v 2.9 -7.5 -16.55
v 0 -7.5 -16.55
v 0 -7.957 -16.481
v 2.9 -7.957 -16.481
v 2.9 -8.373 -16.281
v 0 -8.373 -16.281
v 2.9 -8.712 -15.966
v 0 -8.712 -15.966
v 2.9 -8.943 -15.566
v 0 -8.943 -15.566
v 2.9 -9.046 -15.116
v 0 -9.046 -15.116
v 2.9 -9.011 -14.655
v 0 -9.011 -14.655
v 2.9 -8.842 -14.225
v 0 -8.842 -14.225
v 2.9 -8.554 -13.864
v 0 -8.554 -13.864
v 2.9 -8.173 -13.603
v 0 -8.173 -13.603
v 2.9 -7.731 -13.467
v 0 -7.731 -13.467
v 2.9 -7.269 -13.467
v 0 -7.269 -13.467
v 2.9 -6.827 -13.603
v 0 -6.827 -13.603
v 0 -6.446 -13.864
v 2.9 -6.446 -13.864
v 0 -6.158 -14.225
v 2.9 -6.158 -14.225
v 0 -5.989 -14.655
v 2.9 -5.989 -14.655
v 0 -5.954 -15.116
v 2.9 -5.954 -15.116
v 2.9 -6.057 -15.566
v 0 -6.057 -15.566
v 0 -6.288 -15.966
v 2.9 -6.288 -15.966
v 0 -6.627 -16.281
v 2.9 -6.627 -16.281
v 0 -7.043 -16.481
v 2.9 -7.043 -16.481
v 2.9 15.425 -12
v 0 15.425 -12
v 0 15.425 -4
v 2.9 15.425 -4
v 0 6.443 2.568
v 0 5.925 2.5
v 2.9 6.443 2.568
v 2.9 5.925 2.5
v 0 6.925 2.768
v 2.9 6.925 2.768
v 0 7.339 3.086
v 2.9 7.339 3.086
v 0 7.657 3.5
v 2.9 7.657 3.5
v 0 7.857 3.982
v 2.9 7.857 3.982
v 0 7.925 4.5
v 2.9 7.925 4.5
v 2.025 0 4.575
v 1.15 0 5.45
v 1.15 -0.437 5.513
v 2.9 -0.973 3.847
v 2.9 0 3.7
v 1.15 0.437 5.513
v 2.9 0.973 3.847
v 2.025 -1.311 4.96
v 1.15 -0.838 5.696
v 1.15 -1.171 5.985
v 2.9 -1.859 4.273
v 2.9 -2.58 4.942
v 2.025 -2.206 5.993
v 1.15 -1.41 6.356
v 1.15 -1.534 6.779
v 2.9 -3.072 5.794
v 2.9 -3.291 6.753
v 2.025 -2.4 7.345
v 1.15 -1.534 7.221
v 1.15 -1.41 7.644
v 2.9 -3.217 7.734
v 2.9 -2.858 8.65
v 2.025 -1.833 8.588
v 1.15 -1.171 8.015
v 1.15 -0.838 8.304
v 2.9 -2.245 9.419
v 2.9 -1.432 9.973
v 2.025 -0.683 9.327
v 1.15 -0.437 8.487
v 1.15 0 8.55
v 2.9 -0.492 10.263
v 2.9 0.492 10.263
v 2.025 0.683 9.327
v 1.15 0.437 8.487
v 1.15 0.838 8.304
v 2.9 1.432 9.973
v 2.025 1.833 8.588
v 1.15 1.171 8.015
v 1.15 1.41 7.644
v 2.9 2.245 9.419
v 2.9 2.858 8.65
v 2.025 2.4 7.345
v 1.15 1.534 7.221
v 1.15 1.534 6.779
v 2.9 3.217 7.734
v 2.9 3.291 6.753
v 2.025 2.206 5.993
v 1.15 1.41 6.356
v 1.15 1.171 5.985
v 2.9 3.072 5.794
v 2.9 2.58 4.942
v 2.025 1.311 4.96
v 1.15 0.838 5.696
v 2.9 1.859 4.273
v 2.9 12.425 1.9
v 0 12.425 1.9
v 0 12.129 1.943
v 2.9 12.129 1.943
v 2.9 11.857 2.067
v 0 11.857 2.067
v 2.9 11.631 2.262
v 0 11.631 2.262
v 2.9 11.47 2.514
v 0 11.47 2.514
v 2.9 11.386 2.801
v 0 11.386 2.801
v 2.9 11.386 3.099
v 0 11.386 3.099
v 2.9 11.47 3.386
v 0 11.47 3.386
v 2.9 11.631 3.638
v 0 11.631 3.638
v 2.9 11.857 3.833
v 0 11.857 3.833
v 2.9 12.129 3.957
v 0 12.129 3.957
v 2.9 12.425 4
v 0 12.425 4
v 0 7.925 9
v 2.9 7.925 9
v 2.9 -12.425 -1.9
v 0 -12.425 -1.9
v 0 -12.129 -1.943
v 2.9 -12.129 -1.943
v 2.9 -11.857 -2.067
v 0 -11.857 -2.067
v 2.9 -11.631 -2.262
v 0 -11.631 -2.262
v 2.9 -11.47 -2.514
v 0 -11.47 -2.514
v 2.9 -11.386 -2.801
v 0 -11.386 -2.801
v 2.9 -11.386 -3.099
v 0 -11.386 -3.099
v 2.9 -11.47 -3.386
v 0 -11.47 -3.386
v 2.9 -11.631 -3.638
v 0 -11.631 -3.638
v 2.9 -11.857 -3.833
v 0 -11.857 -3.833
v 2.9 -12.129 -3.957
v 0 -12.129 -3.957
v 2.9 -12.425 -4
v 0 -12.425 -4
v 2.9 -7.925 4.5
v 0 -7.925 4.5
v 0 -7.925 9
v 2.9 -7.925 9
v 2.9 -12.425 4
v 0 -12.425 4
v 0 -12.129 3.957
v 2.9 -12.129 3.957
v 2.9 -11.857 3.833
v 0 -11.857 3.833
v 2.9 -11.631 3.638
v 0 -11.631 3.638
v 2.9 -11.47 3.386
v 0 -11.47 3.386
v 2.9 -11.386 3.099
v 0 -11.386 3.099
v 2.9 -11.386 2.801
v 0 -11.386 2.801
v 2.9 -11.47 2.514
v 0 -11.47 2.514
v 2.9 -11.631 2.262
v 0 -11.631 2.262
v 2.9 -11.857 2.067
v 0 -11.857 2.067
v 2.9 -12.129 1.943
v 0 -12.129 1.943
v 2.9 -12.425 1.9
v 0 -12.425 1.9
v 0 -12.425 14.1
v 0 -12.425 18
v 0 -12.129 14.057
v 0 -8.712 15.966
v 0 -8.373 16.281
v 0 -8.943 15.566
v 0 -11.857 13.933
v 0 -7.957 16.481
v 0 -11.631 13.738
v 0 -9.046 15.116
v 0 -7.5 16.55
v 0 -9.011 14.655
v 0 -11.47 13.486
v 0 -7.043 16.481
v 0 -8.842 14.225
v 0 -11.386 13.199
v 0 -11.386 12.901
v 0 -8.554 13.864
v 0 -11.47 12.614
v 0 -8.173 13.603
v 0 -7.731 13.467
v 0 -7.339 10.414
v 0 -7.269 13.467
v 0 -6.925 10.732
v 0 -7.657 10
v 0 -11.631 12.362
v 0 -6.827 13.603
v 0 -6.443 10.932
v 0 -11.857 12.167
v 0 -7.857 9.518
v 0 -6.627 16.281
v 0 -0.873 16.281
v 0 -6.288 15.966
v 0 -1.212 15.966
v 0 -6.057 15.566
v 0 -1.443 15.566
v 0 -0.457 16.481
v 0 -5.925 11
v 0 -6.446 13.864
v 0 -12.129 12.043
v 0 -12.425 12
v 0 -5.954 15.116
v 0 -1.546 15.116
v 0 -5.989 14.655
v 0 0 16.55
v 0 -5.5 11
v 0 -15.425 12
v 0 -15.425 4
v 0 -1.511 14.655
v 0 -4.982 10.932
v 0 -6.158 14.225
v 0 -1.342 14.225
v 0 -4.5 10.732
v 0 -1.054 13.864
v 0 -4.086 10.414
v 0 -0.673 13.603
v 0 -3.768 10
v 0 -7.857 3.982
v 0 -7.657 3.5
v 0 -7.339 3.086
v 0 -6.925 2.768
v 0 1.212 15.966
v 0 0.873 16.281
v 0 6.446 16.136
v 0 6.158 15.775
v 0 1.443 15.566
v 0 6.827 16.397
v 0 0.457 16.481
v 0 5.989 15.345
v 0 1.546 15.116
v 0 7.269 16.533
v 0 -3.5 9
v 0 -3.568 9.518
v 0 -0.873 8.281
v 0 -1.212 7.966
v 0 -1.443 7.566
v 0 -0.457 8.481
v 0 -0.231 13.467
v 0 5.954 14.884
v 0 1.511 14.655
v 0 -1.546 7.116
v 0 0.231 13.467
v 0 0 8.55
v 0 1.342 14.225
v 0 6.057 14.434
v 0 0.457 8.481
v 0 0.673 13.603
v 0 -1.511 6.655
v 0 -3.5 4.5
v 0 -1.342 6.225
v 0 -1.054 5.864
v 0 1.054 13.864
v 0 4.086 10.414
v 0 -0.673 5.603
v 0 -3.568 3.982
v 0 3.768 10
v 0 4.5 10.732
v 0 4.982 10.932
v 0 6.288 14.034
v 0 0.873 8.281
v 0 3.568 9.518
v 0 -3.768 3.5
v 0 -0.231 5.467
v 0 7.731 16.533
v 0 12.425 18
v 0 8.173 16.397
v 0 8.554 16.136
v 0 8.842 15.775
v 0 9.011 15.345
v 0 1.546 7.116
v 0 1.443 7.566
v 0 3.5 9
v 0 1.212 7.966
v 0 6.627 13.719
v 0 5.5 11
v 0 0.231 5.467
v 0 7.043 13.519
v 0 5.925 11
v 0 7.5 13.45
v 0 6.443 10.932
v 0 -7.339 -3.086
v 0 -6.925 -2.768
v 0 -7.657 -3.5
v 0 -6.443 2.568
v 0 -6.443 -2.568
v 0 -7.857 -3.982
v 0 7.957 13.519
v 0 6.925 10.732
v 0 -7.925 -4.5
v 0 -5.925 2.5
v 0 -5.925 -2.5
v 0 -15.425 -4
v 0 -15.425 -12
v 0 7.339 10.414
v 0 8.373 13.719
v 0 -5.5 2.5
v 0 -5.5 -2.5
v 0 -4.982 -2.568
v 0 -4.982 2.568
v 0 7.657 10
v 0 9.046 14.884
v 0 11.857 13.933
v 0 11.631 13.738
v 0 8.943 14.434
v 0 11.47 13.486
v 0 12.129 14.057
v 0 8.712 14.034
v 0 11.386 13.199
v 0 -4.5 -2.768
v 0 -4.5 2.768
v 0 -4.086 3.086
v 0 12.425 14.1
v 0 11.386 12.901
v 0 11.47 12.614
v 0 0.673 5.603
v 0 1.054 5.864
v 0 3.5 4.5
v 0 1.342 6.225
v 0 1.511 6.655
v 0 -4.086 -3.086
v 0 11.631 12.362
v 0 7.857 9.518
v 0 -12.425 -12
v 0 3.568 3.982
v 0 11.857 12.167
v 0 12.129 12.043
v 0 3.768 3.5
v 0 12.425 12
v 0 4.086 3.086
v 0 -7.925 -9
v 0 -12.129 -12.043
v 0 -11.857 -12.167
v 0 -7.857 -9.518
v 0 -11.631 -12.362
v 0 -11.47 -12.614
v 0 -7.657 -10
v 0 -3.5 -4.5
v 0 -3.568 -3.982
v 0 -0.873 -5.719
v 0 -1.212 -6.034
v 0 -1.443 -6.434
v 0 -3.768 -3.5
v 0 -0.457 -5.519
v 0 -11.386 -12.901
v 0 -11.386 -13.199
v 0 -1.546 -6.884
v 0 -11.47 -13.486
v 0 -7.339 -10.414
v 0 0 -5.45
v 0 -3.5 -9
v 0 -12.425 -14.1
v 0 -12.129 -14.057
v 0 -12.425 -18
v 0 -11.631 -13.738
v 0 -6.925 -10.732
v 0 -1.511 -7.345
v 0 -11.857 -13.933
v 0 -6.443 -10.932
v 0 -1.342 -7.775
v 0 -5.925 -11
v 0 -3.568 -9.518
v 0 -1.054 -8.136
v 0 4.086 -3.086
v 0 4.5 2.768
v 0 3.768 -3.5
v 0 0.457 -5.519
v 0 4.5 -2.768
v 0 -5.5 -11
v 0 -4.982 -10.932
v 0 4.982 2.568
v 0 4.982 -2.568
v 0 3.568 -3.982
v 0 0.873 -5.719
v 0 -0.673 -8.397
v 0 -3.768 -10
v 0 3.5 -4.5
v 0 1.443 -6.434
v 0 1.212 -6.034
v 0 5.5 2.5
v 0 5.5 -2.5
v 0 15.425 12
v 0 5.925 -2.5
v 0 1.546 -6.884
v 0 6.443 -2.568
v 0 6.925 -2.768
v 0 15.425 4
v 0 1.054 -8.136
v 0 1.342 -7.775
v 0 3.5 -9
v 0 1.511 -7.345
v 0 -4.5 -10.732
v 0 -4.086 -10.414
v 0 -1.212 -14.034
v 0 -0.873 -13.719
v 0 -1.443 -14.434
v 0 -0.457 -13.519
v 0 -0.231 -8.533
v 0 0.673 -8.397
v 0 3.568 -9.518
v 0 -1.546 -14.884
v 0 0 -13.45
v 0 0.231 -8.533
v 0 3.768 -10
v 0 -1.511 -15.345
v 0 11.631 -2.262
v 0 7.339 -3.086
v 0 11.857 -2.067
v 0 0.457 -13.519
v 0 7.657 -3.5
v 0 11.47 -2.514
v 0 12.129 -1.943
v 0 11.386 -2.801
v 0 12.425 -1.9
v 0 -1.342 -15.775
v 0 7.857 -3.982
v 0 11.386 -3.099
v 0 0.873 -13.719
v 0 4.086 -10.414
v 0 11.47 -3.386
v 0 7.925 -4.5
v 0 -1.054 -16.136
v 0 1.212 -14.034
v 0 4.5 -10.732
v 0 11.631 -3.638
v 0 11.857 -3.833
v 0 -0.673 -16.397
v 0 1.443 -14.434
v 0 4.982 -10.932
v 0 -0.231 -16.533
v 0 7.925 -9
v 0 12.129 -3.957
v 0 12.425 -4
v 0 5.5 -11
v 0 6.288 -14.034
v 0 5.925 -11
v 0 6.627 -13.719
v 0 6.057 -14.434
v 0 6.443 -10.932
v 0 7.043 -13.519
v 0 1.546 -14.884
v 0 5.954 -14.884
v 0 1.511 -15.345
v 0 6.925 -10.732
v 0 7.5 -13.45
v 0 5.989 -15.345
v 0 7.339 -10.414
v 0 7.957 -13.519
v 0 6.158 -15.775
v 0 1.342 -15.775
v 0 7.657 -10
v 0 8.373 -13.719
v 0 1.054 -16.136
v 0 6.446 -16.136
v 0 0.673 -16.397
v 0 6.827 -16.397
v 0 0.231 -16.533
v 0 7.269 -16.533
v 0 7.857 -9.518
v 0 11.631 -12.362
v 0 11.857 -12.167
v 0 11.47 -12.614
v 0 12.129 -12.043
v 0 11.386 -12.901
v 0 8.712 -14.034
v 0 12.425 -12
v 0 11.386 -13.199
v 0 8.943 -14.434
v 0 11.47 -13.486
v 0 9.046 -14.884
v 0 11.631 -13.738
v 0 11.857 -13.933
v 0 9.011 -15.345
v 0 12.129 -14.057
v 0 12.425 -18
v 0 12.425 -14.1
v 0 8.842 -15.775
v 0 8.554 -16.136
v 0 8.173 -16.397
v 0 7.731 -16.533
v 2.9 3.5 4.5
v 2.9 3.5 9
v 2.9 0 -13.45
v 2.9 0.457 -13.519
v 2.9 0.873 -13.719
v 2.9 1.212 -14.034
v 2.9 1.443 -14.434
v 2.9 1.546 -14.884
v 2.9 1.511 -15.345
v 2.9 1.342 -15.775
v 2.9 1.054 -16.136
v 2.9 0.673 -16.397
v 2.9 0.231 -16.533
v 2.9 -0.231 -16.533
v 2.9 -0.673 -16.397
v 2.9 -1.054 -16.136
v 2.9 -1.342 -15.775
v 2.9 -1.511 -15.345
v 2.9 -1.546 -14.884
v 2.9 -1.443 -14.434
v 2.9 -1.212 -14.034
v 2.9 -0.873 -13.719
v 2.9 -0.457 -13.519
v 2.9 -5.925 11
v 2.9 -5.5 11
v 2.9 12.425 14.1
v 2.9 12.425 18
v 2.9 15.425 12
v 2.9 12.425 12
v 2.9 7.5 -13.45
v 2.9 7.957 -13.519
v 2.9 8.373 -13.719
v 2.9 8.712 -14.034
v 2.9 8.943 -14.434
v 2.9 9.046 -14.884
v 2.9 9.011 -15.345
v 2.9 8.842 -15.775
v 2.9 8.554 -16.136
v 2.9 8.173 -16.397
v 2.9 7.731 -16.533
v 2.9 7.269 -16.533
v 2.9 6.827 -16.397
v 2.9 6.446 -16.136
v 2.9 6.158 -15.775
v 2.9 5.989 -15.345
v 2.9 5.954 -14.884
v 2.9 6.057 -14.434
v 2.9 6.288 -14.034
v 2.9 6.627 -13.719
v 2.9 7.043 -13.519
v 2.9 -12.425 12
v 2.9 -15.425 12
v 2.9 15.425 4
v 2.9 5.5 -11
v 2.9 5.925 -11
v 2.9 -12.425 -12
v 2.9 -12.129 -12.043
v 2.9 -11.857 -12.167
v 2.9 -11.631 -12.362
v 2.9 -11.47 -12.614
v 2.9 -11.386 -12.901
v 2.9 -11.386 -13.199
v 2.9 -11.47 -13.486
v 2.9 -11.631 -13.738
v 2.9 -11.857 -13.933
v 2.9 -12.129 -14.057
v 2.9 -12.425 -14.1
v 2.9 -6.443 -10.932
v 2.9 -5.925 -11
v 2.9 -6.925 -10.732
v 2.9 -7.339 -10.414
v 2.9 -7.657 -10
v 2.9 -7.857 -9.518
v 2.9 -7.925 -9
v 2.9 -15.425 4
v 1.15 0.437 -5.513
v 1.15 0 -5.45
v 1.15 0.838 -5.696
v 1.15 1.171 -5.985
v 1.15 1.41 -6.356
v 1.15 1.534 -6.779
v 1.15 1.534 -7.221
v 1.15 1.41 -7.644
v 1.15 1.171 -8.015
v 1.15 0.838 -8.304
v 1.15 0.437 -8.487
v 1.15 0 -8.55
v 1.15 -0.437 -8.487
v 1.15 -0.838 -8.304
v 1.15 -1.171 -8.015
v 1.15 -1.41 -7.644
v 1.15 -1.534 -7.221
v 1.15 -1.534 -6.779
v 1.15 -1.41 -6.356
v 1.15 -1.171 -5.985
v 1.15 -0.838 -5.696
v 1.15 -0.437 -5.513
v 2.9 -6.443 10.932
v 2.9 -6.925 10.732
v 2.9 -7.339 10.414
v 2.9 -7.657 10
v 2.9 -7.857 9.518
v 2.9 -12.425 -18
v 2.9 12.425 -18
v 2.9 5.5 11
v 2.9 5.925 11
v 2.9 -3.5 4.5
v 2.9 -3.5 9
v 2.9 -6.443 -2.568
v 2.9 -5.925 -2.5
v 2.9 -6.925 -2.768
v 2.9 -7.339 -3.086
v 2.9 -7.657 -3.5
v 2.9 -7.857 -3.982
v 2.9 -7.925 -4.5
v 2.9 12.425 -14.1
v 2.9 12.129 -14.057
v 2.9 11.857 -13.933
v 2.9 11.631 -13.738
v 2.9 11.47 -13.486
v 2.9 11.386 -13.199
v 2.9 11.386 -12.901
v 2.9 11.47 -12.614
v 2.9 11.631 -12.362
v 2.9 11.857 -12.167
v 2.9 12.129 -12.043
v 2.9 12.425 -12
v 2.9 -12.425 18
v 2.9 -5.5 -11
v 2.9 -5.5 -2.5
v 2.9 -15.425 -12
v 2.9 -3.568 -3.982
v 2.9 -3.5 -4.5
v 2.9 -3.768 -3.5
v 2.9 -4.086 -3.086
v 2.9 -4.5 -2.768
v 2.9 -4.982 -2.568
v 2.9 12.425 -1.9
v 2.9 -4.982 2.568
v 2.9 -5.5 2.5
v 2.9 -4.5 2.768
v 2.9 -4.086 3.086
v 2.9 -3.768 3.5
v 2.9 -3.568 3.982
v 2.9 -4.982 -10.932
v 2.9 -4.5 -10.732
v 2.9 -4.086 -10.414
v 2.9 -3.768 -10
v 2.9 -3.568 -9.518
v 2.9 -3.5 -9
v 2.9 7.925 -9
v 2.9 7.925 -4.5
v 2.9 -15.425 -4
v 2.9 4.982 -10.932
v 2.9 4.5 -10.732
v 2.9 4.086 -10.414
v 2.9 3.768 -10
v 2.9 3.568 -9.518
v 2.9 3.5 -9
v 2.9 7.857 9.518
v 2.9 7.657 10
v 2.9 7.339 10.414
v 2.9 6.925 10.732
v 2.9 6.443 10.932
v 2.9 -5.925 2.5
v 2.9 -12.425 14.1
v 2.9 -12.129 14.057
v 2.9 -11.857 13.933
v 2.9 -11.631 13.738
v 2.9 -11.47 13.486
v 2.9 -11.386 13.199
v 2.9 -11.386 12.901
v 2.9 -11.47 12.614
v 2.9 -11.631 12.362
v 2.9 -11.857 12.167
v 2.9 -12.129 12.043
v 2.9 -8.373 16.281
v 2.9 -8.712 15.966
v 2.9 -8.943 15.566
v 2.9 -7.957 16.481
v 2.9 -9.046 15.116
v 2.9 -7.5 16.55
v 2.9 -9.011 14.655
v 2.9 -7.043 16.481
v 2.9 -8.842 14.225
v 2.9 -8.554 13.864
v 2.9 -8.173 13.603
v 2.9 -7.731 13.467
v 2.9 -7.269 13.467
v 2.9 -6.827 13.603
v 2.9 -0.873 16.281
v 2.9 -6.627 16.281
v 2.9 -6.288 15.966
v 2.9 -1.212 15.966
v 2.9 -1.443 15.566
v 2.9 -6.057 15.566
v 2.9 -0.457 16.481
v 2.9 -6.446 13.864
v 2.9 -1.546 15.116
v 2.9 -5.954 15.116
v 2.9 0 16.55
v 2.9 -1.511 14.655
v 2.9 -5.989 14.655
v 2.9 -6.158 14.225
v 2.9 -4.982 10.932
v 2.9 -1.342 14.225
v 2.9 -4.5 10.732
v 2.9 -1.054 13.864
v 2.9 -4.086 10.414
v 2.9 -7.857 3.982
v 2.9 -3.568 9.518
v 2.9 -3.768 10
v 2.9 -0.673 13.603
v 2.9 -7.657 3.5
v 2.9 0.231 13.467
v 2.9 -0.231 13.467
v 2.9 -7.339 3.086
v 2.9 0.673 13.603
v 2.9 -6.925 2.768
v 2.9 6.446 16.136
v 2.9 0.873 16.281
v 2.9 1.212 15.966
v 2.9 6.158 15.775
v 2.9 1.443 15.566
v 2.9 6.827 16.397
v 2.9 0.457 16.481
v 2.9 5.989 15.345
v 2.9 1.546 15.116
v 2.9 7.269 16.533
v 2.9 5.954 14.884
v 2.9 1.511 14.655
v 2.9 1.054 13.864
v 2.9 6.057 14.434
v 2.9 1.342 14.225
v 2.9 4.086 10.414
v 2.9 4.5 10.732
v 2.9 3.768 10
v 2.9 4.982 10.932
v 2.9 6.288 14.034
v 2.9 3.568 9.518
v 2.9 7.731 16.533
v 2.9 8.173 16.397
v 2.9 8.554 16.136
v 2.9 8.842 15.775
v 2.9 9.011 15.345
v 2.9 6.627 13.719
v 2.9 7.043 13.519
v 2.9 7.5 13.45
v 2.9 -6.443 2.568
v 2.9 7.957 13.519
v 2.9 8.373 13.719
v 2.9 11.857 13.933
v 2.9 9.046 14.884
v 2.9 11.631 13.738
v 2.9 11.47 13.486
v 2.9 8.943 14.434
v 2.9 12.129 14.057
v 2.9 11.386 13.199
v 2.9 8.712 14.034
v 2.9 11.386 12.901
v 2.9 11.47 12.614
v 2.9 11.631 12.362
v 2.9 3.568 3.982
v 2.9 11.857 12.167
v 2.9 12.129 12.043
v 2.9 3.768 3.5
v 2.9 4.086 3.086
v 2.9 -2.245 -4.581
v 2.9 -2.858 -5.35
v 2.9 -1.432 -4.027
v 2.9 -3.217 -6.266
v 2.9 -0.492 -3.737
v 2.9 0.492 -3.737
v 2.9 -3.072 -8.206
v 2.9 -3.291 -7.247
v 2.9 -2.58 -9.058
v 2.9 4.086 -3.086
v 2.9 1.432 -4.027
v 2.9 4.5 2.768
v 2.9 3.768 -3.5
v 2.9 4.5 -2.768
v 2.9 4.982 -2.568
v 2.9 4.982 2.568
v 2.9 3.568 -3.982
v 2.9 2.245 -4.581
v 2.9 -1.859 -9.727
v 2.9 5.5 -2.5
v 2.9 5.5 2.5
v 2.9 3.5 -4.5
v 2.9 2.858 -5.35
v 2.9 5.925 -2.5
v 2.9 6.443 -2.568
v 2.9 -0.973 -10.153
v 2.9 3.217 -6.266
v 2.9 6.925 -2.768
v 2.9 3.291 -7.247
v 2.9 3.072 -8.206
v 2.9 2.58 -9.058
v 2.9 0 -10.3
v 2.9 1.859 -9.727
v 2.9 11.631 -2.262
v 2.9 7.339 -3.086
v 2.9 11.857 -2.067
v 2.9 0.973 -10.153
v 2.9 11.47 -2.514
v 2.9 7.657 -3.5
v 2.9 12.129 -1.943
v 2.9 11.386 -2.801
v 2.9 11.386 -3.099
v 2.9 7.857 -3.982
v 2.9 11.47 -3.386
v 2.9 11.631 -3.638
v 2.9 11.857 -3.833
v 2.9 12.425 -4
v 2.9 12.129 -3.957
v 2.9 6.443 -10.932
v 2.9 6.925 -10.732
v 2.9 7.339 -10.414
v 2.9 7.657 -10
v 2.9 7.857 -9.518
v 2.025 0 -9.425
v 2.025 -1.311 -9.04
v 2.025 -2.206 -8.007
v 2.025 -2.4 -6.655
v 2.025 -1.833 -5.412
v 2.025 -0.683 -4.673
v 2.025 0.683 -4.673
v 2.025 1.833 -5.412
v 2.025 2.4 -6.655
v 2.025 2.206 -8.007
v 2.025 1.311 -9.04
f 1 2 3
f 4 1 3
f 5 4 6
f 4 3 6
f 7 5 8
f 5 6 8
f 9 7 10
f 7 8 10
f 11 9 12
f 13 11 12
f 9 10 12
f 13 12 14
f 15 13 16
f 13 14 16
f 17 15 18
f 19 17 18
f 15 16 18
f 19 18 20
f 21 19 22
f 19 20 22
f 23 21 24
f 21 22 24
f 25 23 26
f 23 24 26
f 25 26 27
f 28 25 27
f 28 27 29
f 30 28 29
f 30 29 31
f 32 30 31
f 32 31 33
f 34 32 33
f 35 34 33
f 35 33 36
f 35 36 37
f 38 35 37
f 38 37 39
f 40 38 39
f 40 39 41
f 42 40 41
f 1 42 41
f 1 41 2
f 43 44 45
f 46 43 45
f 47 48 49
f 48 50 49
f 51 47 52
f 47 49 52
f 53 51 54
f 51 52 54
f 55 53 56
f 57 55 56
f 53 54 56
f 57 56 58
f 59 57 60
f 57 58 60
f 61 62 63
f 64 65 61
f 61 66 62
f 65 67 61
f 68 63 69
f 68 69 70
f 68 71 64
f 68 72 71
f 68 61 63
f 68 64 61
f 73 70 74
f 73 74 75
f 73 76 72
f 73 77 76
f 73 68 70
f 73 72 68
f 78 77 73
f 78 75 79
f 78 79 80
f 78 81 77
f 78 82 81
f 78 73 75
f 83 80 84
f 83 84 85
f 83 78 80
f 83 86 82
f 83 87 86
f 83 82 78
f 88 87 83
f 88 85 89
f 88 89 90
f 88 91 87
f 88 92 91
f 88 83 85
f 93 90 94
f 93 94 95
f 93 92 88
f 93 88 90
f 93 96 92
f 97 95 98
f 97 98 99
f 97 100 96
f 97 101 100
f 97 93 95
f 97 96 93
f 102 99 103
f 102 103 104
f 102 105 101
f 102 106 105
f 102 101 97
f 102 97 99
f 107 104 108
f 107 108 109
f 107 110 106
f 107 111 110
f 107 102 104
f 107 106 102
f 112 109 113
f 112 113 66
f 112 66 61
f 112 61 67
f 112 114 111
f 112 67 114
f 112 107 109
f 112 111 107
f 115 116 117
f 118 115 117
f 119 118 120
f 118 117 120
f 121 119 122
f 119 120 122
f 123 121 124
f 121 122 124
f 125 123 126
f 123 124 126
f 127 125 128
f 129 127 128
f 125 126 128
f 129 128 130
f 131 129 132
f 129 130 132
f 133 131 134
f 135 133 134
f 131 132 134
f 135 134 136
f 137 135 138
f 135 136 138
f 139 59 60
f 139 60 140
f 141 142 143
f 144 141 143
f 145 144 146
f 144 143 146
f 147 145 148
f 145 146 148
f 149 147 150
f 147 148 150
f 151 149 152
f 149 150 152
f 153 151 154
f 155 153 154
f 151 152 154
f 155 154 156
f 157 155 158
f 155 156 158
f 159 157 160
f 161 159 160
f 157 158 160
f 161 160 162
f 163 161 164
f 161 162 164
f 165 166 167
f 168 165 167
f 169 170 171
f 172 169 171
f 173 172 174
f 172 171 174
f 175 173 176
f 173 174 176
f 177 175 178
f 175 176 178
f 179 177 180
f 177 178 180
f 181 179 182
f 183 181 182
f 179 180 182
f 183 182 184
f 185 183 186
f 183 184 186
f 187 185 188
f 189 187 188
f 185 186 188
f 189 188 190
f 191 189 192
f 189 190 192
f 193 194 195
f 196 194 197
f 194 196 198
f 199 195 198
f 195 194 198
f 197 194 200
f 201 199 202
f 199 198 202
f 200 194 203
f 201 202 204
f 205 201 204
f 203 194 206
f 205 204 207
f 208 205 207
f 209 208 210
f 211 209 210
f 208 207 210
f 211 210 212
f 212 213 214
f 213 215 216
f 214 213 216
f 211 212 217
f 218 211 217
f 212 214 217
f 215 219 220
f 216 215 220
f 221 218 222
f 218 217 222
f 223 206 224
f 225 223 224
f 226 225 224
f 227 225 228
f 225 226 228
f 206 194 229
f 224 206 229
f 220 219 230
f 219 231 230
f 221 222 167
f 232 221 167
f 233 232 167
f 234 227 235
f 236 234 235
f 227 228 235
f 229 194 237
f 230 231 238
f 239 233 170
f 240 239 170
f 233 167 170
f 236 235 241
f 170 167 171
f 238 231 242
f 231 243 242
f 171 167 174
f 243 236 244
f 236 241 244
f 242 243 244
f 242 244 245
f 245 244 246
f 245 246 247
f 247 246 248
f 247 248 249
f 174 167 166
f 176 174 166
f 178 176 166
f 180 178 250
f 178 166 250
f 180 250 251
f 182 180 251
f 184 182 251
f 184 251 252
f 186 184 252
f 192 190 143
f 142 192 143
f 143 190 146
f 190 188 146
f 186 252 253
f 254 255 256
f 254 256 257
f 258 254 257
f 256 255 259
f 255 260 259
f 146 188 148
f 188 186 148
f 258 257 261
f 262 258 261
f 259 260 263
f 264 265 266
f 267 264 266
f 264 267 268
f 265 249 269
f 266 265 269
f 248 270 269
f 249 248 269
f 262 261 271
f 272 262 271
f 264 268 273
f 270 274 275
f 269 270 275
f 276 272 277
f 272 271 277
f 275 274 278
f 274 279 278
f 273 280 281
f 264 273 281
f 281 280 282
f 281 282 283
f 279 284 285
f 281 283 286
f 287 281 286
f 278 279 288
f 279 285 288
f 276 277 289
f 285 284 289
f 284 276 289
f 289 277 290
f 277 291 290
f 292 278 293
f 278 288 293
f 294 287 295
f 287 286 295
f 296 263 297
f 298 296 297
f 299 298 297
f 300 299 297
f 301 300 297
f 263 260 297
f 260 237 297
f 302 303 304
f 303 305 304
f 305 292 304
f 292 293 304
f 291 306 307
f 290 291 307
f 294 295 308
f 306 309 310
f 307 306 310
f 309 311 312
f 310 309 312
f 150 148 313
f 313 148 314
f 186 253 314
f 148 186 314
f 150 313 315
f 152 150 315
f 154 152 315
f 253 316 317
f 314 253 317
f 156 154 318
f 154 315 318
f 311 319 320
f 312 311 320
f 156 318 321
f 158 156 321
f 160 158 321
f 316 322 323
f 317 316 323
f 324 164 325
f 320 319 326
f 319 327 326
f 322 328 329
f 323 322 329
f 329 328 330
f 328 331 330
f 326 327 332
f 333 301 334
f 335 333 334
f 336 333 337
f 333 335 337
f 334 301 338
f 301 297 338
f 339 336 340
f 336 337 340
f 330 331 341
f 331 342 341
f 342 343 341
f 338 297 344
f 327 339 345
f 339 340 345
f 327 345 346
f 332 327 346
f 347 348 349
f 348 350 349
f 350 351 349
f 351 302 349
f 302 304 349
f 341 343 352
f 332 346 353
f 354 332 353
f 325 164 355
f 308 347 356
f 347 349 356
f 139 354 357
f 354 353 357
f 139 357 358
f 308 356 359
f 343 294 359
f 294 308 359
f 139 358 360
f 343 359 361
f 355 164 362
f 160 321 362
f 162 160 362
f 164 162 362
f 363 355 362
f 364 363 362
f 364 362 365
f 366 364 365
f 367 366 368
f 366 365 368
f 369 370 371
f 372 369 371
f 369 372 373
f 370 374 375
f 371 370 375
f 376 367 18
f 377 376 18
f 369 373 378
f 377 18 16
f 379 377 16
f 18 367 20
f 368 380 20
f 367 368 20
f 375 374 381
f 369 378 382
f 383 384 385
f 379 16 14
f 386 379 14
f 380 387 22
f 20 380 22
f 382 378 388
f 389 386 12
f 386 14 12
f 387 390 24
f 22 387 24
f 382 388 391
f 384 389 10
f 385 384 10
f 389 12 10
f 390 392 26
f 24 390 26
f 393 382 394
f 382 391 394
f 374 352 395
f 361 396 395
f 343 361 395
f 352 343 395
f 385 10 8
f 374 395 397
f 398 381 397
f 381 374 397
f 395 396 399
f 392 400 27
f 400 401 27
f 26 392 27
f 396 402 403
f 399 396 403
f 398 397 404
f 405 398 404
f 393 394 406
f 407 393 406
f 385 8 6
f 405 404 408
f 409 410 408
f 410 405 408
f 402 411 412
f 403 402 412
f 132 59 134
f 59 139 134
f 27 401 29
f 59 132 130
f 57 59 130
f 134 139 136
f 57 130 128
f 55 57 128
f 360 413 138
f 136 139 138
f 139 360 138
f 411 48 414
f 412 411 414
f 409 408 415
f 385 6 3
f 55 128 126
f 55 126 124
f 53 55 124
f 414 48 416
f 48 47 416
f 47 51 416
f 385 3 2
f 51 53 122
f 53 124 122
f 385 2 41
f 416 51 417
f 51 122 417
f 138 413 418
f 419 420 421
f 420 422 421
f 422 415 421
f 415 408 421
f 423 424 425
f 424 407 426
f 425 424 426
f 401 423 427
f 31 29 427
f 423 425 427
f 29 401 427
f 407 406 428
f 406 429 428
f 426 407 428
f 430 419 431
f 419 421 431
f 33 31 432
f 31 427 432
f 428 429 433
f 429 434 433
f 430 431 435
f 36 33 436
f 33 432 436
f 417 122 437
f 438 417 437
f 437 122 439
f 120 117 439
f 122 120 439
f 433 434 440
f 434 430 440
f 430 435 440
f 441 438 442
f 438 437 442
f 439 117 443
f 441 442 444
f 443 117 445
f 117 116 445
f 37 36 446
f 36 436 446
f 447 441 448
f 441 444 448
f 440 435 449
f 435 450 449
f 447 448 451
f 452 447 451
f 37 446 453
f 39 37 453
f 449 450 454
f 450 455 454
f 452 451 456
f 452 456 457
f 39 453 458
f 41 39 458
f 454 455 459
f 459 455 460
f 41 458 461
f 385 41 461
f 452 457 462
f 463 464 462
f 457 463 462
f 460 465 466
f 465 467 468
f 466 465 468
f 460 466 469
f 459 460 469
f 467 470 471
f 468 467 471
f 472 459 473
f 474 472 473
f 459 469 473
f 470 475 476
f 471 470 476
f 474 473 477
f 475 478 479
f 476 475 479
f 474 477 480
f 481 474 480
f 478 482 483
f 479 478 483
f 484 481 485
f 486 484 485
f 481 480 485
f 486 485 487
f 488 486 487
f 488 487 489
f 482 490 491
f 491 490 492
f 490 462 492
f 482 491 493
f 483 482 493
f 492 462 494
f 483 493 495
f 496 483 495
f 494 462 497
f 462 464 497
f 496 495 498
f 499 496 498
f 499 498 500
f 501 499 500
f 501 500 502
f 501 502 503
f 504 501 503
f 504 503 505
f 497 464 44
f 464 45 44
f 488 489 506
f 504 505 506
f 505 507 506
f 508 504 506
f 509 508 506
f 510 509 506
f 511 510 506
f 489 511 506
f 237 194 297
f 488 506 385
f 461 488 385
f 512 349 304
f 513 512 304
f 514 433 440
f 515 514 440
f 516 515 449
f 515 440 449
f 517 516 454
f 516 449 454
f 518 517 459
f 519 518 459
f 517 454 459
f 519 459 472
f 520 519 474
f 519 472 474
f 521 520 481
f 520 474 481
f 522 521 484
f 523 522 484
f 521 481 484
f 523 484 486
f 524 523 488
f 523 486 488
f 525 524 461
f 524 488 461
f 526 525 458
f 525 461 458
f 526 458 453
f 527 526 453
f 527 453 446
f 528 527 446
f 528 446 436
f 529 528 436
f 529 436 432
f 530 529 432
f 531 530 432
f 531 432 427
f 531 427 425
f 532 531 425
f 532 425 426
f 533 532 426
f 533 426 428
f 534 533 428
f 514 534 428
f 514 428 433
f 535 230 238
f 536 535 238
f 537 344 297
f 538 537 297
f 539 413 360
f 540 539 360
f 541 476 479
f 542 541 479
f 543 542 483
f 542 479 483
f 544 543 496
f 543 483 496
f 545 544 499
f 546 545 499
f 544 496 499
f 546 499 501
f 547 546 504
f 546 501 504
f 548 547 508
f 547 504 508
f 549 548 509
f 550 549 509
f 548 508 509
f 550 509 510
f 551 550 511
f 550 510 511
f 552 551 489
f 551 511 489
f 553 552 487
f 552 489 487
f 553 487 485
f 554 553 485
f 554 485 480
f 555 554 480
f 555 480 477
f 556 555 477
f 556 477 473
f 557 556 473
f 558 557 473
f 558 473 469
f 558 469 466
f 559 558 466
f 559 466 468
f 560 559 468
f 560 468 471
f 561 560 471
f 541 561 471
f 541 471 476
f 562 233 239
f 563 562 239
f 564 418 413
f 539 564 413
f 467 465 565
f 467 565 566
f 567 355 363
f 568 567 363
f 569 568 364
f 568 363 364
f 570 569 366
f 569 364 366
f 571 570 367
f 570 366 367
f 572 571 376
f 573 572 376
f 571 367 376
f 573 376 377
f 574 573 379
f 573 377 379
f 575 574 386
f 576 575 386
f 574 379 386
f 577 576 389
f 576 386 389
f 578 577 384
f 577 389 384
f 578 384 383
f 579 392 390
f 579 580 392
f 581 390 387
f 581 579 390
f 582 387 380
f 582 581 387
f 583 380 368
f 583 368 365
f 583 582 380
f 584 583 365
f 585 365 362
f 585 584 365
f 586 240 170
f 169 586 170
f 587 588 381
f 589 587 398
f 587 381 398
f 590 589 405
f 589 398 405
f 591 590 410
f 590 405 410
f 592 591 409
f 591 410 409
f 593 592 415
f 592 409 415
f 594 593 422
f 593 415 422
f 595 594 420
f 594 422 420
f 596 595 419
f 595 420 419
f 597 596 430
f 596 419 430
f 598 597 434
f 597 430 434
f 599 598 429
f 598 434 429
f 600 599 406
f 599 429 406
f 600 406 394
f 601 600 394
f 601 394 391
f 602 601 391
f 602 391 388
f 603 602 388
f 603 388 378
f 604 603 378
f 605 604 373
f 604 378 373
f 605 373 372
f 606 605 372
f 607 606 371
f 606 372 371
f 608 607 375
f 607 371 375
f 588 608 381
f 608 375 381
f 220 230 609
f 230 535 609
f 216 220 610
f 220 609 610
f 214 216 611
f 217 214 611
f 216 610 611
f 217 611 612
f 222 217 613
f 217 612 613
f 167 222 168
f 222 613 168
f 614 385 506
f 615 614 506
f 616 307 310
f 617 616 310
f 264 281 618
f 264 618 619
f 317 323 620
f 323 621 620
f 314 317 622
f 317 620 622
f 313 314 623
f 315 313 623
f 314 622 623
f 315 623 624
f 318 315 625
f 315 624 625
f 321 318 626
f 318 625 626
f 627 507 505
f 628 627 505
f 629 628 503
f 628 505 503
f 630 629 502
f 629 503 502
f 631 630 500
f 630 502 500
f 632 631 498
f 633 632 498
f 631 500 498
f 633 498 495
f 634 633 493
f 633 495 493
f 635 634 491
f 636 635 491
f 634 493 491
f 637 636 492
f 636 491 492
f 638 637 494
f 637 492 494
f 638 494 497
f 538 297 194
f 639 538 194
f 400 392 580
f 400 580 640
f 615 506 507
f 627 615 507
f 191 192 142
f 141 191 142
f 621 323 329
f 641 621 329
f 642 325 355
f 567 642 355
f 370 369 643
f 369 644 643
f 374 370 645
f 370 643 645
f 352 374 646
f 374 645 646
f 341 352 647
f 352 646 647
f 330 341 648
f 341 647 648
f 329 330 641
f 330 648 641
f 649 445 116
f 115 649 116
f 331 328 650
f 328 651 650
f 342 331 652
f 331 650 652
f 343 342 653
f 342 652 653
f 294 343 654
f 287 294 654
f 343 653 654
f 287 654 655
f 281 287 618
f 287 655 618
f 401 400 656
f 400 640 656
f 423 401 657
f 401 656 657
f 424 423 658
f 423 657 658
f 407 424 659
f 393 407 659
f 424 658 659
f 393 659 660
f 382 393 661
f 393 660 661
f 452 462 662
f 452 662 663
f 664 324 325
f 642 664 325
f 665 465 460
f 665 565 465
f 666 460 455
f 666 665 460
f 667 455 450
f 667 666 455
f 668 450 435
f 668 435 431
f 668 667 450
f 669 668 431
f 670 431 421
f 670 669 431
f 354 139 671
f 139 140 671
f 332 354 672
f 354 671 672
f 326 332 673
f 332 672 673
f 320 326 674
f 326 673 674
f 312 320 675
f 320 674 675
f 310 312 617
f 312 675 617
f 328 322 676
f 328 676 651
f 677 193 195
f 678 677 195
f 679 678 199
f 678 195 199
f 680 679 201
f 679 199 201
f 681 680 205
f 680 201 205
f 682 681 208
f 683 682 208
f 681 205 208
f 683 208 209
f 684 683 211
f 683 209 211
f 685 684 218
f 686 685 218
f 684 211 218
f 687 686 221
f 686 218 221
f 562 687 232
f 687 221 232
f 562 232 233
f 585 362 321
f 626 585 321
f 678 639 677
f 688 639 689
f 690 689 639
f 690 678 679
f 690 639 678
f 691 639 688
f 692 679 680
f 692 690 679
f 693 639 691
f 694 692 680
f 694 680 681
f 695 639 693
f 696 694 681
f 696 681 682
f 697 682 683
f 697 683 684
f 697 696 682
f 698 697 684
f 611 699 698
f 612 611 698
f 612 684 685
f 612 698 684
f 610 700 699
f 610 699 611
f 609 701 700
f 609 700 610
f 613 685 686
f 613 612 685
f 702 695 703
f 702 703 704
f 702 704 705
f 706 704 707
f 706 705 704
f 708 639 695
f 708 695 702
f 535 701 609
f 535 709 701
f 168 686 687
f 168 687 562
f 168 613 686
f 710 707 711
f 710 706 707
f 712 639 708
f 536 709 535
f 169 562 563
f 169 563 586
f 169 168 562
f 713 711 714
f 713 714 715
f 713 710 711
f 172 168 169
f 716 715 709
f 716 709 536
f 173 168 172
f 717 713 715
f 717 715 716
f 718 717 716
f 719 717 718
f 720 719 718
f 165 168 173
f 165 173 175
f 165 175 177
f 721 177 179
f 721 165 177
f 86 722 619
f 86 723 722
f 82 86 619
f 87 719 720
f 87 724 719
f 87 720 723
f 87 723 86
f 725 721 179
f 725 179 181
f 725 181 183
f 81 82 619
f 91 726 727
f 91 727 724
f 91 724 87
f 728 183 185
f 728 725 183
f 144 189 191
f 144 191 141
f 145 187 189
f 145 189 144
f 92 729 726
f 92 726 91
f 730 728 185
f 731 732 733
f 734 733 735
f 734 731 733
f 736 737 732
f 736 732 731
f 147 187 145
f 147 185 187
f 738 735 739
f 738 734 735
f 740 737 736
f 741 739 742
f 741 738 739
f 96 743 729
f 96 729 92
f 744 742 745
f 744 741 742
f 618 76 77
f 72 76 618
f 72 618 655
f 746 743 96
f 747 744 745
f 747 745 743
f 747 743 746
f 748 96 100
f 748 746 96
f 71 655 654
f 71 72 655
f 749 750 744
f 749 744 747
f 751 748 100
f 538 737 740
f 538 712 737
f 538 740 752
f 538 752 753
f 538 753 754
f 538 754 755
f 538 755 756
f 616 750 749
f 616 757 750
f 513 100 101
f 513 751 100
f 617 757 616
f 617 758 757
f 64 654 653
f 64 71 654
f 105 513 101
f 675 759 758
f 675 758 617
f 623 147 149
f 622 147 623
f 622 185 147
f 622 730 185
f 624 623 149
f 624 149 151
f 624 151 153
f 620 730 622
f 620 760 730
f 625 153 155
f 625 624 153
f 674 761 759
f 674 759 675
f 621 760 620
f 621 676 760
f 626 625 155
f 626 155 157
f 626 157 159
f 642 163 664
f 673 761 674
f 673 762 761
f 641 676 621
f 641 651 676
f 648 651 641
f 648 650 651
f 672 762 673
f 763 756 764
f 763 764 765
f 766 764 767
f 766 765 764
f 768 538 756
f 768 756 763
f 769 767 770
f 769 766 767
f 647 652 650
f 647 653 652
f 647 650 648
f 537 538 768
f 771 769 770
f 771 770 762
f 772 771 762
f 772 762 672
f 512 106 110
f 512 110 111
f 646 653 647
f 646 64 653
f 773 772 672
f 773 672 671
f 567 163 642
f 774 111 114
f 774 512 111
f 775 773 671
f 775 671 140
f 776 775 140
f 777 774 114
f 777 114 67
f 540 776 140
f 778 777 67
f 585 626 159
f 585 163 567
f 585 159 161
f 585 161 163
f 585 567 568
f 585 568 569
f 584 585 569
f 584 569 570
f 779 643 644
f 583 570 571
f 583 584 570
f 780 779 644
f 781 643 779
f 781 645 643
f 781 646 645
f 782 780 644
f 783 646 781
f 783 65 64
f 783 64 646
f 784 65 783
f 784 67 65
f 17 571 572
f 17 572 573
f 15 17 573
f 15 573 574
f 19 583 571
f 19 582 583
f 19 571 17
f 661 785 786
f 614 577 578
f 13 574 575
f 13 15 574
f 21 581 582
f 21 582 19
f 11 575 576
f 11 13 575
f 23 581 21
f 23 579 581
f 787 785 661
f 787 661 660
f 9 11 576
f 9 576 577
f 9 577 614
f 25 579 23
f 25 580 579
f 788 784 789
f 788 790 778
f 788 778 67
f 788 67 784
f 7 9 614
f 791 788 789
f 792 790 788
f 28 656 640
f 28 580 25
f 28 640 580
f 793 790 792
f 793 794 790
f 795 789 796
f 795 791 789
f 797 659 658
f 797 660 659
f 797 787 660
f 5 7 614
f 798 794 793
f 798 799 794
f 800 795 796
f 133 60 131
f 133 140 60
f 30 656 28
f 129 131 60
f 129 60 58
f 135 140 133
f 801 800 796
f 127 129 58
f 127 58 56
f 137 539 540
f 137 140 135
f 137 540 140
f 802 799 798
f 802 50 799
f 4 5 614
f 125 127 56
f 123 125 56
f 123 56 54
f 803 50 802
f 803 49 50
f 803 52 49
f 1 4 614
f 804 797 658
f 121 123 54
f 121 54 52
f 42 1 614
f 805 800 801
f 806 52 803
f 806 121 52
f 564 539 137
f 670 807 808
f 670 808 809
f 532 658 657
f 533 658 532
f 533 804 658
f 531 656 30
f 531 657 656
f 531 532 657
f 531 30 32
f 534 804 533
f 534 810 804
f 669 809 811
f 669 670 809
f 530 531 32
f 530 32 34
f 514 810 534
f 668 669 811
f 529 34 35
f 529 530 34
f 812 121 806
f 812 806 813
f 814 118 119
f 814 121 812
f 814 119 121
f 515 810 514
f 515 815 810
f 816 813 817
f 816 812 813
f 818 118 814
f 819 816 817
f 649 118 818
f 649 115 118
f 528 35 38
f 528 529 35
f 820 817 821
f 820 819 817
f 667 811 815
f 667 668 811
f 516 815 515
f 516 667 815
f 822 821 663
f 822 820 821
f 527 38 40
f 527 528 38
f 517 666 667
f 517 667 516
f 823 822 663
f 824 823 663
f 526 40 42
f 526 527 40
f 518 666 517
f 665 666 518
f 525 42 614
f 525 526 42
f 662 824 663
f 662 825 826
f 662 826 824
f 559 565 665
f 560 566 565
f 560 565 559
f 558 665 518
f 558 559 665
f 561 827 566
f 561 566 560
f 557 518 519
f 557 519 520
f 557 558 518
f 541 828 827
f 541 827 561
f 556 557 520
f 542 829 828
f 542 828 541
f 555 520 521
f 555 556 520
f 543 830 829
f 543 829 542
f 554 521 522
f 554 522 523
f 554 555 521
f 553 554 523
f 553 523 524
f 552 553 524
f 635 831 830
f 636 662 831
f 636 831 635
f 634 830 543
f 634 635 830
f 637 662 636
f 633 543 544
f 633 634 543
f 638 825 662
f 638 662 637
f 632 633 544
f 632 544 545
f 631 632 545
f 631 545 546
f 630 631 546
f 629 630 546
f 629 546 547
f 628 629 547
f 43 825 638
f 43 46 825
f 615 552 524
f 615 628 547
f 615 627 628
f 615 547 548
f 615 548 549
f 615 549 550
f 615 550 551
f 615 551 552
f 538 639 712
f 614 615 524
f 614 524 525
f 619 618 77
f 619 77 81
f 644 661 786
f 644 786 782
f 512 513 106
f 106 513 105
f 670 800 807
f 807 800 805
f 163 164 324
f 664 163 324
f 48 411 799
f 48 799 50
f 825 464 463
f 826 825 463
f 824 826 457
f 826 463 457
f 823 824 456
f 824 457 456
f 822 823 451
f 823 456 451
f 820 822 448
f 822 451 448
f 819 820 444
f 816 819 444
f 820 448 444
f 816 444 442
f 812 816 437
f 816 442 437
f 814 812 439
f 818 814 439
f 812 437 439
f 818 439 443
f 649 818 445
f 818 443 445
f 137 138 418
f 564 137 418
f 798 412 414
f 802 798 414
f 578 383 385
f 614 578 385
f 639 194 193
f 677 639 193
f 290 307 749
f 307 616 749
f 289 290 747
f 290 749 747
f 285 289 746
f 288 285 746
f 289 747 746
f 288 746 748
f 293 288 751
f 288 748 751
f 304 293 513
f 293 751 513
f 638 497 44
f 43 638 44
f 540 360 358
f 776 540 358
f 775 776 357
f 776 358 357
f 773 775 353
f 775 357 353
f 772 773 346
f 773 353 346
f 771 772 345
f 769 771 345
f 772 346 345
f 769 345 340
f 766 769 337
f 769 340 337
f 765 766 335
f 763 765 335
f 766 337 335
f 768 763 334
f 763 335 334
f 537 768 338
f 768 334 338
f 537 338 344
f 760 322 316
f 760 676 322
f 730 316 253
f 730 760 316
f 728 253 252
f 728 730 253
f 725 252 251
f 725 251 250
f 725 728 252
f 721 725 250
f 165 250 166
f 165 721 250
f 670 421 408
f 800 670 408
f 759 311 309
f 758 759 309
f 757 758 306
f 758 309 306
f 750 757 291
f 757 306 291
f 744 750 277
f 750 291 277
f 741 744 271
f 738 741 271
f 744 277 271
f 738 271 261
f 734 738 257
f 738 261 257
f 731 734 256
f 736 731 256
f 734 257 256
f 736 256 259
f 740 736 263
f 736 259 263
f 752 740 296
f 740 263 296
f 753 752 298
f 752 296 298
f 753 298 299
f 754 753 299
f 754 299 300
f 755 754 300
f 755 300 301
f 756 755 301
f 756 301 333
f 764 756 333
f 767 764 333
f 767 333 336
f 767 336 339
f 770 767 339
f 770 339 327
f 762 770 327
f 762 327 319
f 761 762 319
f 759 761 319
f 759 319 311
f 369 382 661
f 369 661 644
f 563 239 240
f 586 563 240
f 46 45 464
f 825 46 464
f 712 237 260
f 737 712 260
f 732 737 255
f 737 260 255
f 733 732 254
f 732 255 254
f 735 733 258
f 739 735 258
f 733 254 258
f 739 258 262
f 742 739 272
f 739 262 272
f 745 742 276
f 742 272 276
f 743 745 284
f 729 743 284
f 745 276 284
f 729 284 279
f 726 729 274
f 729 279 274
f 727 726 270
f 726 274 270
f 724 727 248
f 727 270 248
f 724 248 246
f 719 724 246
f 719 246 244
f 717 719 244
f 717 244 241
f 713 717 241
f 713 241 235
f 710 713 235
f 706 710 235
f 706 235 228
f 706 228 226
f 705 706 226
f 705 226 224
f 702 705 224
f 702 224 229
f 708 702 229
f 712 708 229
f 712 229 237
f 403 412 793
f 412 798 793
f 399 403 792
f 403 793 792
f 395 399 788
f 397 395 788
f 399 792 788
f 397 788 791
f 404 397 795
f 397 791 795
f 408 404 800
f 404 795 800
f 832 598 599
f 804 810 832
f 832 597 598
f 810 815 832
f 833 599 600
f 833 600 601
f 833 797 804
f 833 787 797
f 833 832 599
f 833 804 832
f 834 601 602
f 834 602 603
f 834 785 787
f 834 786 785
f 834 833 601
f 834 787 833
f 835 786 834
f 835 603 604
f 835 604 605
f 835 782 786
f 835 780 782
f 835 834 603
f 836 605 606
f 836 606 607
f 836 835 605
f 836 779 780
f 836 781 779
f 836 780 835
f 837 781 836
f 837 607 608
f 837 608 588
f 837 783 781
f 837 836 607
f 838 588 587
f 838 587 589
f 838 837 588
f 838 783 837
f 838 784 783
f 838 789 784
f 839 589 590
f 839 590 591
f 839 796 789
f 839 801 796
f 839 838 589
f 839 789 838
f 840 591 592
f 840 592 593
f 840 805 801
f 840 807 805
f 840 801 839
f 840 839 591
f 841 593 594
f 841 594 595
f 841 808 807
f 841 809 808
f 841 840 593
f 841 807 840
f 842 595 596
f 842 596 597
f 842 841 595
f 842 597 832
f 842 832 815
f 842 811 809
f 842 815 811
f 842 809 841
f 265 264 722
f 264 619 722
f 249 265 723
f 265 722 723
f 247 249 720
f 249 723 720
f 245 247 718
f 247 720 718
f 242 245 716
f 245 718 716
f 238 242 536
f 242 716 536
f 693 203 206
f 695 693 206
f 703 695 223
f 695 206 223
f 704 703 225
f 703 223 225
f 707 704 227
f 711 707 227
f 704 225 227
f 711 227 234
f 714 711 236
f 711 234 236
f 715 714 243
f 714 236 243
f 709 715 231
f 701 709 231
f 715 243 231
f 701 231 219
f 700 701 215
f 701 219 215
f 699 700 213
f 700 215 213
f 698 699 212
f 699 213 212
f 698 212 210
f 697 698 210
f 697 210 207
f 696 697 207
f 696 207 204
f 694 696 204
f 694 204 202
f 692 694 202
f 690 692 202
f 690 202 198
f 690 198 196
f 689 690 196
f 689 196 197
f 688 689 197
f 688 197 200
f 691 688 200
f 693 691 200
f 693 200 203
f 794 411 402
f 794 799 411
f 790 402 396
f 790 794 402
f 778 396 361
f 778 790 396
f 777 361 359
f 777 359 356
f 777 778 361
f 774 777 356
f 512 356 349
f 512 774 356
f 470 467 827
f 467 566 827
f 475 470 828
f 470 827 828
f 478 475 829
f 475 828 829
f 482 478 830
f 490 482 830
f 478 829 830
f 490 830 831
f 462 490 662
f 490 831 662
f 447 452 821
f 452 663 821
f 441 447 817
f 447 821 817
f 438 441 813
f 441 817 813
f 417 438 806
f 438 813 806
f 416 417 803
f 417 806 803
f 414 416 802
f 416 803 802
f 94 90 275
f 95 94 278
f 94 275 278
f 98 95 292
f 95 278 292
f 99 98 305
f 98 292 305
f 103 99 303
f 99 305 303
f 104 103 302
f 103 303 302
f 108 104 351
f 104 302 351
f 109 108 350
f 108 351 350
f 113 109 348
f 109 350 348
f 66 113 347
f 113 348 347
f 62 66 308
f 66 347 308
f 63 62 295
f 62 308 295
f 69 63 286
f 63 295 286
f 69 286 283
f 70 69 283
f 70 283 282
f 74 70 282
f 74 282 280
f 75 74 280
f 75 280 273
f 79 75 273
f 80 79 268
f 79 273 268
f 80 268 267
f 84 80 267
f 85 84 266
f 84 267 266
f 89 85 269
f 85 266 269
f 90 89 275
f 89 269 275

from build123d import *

# Parameters (mm, degrees)
EXTRUDE_1_DEPTH          = 2.9
SKETCH_2_R               = 1.55
SKETCH_2_W               = 8.5
SKETCH_2_H               = 4.425
CUT_EXTRUDE_1_DEPTH      = 10
FILLET_1_R               = 2
HOLE_WIZARD_1_AT_2_COUNT = 2
HOLE_WIZARD_1_AT_2_PITCH = 14


with BuildPart() as part:
    # 草图1 → 凸台-拉伸1 (new body)
    with BuildSketch(Plane(origin=(0, 0, 0), x_dir=(0, 0, -1), z_dir=(1, 0, 0))):
        with BuildLine():
            Line((-12, 15.425), (-12, 12.425))
            ThreePointArc((-12, 12.425), (-13.05, 11.375), (-14.1, 12.425))
            Line((-14.1, 12.425), (-18, 12.425))
            Line((-18, 12.425), (-18, -12.425))
            Line((-18, -12.425), (-14.1, -12.425))
            ThreePointArc((-14.1, -12.425), (-13.05, -11.375), (-12, -12.425))
            Line((-12, -12.425), (-12, -15.425))
            Line((-12, -15.425), (-4, -15.425))
            Line((-4, -15.425), (-4, -12.425))
            ThreePointArc((-4, -12.425), (-2.95, -11.375), (-1.9, -12.425))
            Line((-1.9, -12.425), (1.9, -12.425))
            ThreePointArc((1.9, -12.425), (2.95, -11.375), (4, -12.425))
            Line((4, -12.425), (4, -15.425))
            Line((4, -15.425), (12, -15.425))
            Line((12, -15.425), (12, -12.425))
            ThreePointArc((12, -12.425), (13.05, -11.375), (14.1, -12.425))
            Line((14.1, -12.425), (18, -12.425))
            Line((18, -12.425), (18, 12.425))
            Line((18, 12.425), (14.1, 12.425))
            ThreePointArc((14.1, 12.425), (13.05, 11.375), (12, 12.425))
            Line((12, 12.425), (12, 15.425))
            Line((12, 15.425), (4, 15.425))
            Line((4, 15.425), (4, 12.425))
            ThreePointArc((4, 12.425), (2.95, 11.375), (1.9, 12.425))
            Line((1.9, 12.425), (-1.9, 12.425))
            ThreePointArc((-1.9, 12.425), (-2.95, 11.375), (-4, 12.425))
            Line((-4, 12.425), (-4, 15.425))
            Line((-4, 15.425), (-12, 15.425))
        make_face()
    extrude(amount=EXTRUDE_1_DEPTH)

    # 草图2 → 切除-拉伸1 (cut)
    with BuildSketch(Plane.ZY):
        with Locations((-15, 7.5)):
            Circle(SKETCH_2_R)
        with Locations(Location((-15, -7.5, 0), (0, 0, 180))):
            Circle(SKETCH_2_R)
        with Locations((15, 0)):
            Circle(SKETCH_2_R)
        with Locations((-15, 0)):
            Circle(SKETCH_2_R)
        with Locations((15, -7.5)):
            Circle(SKETCH_2_R)
        with Locations(Location((15, 7.5, 0), (0, 0, 180))):
            Circle(SKETCH_2_R)
        with Locations((-7, 0)):
            Circle(SKETCH_2_R)
        with Locations((7, 0)):
            Circle(SKETCH_2_R)
        with Locations((-6.75, 5.7125)):
            Rectangle(SKETCH_2_W, SKETCH_2_H)
        with Locations((-6.75, -5.7125)):
            Rectangle(SKETCH_2_W, SKETCH_2_H)
        with Locations((6.75, -5.7125)):
            Rectangle(SKETCH_2_W, SKETCH_2_H)
        with Locations((6.75, 5.7125)):
            Rectangle(SKETCH_2_W, SKETCH_2_H)
    extrude(amount=-CUT_EXTRUDE_1_DEPTH, mode=Mode.SUBTRACT)

    # 圆角1
    fillet_1_edges = [part.edges().sort_by_distance(p)[0] for p in [
        (1.45, -3.5, -2.5),
        (1.45, -7.925, -2.5),
        (1.45, -7.925, -11),
        (1.45, -3.5, -11),
        (1.45, 3.5, -11),
        (1.45, 7.925, -11),
        (1.45, 7.925, -2.5),
        (1.45, 3.5, -2.5),
        (1.45, 7.925, 11),
        (1.45, 3.5, 11),
        (1.45, 3.5, 2.5),
        (1.45, 7.925, 2.5),
        (1.45, -7.925, 11),
        (1.45, -7.925, 2.5),
        (1.45, -3.5, 2.5),
        (1.45, -3.5, 11),
    ]]
    fillet(fillet_1_edges, radius=FILLET_1_R)

    # 草图3 → 打孔尺寸(%根据十字)槽沉头木螺钉的类型1 (revolve, cut)
    with BuildSketch(Plane(origin=(2.9, 0, 7), x_dir=(0, 0, -1), z_dir=(0, 1, 0))):
        Polygon((0, 0), (0, 2.9), (1.55, 2.9), (1.55, 1.75), (3.3, 0), align=None)
    hole_wizard_1 = revolve(axis=Axis((9.25, 0, 7), (-1, 0, 0)), mode=Mode.SUBTRACT)

    # 打孔尺寸(%根据十字)槽沉头木螺钉的类型1 at 2: 打孔尺寸(%根据十字)槽沉头木螺钉的类型1 ×2
    with Locations(*[(0, 0, -i * HOLE_WIZARD_1_AT_2_PITCH) for i in range(1, HOLE_WIZARD_1_AT_2_COUNT)]):
        add(hole_wizard_1, mode=Mode.SUBTRACT)


solid = part.part
